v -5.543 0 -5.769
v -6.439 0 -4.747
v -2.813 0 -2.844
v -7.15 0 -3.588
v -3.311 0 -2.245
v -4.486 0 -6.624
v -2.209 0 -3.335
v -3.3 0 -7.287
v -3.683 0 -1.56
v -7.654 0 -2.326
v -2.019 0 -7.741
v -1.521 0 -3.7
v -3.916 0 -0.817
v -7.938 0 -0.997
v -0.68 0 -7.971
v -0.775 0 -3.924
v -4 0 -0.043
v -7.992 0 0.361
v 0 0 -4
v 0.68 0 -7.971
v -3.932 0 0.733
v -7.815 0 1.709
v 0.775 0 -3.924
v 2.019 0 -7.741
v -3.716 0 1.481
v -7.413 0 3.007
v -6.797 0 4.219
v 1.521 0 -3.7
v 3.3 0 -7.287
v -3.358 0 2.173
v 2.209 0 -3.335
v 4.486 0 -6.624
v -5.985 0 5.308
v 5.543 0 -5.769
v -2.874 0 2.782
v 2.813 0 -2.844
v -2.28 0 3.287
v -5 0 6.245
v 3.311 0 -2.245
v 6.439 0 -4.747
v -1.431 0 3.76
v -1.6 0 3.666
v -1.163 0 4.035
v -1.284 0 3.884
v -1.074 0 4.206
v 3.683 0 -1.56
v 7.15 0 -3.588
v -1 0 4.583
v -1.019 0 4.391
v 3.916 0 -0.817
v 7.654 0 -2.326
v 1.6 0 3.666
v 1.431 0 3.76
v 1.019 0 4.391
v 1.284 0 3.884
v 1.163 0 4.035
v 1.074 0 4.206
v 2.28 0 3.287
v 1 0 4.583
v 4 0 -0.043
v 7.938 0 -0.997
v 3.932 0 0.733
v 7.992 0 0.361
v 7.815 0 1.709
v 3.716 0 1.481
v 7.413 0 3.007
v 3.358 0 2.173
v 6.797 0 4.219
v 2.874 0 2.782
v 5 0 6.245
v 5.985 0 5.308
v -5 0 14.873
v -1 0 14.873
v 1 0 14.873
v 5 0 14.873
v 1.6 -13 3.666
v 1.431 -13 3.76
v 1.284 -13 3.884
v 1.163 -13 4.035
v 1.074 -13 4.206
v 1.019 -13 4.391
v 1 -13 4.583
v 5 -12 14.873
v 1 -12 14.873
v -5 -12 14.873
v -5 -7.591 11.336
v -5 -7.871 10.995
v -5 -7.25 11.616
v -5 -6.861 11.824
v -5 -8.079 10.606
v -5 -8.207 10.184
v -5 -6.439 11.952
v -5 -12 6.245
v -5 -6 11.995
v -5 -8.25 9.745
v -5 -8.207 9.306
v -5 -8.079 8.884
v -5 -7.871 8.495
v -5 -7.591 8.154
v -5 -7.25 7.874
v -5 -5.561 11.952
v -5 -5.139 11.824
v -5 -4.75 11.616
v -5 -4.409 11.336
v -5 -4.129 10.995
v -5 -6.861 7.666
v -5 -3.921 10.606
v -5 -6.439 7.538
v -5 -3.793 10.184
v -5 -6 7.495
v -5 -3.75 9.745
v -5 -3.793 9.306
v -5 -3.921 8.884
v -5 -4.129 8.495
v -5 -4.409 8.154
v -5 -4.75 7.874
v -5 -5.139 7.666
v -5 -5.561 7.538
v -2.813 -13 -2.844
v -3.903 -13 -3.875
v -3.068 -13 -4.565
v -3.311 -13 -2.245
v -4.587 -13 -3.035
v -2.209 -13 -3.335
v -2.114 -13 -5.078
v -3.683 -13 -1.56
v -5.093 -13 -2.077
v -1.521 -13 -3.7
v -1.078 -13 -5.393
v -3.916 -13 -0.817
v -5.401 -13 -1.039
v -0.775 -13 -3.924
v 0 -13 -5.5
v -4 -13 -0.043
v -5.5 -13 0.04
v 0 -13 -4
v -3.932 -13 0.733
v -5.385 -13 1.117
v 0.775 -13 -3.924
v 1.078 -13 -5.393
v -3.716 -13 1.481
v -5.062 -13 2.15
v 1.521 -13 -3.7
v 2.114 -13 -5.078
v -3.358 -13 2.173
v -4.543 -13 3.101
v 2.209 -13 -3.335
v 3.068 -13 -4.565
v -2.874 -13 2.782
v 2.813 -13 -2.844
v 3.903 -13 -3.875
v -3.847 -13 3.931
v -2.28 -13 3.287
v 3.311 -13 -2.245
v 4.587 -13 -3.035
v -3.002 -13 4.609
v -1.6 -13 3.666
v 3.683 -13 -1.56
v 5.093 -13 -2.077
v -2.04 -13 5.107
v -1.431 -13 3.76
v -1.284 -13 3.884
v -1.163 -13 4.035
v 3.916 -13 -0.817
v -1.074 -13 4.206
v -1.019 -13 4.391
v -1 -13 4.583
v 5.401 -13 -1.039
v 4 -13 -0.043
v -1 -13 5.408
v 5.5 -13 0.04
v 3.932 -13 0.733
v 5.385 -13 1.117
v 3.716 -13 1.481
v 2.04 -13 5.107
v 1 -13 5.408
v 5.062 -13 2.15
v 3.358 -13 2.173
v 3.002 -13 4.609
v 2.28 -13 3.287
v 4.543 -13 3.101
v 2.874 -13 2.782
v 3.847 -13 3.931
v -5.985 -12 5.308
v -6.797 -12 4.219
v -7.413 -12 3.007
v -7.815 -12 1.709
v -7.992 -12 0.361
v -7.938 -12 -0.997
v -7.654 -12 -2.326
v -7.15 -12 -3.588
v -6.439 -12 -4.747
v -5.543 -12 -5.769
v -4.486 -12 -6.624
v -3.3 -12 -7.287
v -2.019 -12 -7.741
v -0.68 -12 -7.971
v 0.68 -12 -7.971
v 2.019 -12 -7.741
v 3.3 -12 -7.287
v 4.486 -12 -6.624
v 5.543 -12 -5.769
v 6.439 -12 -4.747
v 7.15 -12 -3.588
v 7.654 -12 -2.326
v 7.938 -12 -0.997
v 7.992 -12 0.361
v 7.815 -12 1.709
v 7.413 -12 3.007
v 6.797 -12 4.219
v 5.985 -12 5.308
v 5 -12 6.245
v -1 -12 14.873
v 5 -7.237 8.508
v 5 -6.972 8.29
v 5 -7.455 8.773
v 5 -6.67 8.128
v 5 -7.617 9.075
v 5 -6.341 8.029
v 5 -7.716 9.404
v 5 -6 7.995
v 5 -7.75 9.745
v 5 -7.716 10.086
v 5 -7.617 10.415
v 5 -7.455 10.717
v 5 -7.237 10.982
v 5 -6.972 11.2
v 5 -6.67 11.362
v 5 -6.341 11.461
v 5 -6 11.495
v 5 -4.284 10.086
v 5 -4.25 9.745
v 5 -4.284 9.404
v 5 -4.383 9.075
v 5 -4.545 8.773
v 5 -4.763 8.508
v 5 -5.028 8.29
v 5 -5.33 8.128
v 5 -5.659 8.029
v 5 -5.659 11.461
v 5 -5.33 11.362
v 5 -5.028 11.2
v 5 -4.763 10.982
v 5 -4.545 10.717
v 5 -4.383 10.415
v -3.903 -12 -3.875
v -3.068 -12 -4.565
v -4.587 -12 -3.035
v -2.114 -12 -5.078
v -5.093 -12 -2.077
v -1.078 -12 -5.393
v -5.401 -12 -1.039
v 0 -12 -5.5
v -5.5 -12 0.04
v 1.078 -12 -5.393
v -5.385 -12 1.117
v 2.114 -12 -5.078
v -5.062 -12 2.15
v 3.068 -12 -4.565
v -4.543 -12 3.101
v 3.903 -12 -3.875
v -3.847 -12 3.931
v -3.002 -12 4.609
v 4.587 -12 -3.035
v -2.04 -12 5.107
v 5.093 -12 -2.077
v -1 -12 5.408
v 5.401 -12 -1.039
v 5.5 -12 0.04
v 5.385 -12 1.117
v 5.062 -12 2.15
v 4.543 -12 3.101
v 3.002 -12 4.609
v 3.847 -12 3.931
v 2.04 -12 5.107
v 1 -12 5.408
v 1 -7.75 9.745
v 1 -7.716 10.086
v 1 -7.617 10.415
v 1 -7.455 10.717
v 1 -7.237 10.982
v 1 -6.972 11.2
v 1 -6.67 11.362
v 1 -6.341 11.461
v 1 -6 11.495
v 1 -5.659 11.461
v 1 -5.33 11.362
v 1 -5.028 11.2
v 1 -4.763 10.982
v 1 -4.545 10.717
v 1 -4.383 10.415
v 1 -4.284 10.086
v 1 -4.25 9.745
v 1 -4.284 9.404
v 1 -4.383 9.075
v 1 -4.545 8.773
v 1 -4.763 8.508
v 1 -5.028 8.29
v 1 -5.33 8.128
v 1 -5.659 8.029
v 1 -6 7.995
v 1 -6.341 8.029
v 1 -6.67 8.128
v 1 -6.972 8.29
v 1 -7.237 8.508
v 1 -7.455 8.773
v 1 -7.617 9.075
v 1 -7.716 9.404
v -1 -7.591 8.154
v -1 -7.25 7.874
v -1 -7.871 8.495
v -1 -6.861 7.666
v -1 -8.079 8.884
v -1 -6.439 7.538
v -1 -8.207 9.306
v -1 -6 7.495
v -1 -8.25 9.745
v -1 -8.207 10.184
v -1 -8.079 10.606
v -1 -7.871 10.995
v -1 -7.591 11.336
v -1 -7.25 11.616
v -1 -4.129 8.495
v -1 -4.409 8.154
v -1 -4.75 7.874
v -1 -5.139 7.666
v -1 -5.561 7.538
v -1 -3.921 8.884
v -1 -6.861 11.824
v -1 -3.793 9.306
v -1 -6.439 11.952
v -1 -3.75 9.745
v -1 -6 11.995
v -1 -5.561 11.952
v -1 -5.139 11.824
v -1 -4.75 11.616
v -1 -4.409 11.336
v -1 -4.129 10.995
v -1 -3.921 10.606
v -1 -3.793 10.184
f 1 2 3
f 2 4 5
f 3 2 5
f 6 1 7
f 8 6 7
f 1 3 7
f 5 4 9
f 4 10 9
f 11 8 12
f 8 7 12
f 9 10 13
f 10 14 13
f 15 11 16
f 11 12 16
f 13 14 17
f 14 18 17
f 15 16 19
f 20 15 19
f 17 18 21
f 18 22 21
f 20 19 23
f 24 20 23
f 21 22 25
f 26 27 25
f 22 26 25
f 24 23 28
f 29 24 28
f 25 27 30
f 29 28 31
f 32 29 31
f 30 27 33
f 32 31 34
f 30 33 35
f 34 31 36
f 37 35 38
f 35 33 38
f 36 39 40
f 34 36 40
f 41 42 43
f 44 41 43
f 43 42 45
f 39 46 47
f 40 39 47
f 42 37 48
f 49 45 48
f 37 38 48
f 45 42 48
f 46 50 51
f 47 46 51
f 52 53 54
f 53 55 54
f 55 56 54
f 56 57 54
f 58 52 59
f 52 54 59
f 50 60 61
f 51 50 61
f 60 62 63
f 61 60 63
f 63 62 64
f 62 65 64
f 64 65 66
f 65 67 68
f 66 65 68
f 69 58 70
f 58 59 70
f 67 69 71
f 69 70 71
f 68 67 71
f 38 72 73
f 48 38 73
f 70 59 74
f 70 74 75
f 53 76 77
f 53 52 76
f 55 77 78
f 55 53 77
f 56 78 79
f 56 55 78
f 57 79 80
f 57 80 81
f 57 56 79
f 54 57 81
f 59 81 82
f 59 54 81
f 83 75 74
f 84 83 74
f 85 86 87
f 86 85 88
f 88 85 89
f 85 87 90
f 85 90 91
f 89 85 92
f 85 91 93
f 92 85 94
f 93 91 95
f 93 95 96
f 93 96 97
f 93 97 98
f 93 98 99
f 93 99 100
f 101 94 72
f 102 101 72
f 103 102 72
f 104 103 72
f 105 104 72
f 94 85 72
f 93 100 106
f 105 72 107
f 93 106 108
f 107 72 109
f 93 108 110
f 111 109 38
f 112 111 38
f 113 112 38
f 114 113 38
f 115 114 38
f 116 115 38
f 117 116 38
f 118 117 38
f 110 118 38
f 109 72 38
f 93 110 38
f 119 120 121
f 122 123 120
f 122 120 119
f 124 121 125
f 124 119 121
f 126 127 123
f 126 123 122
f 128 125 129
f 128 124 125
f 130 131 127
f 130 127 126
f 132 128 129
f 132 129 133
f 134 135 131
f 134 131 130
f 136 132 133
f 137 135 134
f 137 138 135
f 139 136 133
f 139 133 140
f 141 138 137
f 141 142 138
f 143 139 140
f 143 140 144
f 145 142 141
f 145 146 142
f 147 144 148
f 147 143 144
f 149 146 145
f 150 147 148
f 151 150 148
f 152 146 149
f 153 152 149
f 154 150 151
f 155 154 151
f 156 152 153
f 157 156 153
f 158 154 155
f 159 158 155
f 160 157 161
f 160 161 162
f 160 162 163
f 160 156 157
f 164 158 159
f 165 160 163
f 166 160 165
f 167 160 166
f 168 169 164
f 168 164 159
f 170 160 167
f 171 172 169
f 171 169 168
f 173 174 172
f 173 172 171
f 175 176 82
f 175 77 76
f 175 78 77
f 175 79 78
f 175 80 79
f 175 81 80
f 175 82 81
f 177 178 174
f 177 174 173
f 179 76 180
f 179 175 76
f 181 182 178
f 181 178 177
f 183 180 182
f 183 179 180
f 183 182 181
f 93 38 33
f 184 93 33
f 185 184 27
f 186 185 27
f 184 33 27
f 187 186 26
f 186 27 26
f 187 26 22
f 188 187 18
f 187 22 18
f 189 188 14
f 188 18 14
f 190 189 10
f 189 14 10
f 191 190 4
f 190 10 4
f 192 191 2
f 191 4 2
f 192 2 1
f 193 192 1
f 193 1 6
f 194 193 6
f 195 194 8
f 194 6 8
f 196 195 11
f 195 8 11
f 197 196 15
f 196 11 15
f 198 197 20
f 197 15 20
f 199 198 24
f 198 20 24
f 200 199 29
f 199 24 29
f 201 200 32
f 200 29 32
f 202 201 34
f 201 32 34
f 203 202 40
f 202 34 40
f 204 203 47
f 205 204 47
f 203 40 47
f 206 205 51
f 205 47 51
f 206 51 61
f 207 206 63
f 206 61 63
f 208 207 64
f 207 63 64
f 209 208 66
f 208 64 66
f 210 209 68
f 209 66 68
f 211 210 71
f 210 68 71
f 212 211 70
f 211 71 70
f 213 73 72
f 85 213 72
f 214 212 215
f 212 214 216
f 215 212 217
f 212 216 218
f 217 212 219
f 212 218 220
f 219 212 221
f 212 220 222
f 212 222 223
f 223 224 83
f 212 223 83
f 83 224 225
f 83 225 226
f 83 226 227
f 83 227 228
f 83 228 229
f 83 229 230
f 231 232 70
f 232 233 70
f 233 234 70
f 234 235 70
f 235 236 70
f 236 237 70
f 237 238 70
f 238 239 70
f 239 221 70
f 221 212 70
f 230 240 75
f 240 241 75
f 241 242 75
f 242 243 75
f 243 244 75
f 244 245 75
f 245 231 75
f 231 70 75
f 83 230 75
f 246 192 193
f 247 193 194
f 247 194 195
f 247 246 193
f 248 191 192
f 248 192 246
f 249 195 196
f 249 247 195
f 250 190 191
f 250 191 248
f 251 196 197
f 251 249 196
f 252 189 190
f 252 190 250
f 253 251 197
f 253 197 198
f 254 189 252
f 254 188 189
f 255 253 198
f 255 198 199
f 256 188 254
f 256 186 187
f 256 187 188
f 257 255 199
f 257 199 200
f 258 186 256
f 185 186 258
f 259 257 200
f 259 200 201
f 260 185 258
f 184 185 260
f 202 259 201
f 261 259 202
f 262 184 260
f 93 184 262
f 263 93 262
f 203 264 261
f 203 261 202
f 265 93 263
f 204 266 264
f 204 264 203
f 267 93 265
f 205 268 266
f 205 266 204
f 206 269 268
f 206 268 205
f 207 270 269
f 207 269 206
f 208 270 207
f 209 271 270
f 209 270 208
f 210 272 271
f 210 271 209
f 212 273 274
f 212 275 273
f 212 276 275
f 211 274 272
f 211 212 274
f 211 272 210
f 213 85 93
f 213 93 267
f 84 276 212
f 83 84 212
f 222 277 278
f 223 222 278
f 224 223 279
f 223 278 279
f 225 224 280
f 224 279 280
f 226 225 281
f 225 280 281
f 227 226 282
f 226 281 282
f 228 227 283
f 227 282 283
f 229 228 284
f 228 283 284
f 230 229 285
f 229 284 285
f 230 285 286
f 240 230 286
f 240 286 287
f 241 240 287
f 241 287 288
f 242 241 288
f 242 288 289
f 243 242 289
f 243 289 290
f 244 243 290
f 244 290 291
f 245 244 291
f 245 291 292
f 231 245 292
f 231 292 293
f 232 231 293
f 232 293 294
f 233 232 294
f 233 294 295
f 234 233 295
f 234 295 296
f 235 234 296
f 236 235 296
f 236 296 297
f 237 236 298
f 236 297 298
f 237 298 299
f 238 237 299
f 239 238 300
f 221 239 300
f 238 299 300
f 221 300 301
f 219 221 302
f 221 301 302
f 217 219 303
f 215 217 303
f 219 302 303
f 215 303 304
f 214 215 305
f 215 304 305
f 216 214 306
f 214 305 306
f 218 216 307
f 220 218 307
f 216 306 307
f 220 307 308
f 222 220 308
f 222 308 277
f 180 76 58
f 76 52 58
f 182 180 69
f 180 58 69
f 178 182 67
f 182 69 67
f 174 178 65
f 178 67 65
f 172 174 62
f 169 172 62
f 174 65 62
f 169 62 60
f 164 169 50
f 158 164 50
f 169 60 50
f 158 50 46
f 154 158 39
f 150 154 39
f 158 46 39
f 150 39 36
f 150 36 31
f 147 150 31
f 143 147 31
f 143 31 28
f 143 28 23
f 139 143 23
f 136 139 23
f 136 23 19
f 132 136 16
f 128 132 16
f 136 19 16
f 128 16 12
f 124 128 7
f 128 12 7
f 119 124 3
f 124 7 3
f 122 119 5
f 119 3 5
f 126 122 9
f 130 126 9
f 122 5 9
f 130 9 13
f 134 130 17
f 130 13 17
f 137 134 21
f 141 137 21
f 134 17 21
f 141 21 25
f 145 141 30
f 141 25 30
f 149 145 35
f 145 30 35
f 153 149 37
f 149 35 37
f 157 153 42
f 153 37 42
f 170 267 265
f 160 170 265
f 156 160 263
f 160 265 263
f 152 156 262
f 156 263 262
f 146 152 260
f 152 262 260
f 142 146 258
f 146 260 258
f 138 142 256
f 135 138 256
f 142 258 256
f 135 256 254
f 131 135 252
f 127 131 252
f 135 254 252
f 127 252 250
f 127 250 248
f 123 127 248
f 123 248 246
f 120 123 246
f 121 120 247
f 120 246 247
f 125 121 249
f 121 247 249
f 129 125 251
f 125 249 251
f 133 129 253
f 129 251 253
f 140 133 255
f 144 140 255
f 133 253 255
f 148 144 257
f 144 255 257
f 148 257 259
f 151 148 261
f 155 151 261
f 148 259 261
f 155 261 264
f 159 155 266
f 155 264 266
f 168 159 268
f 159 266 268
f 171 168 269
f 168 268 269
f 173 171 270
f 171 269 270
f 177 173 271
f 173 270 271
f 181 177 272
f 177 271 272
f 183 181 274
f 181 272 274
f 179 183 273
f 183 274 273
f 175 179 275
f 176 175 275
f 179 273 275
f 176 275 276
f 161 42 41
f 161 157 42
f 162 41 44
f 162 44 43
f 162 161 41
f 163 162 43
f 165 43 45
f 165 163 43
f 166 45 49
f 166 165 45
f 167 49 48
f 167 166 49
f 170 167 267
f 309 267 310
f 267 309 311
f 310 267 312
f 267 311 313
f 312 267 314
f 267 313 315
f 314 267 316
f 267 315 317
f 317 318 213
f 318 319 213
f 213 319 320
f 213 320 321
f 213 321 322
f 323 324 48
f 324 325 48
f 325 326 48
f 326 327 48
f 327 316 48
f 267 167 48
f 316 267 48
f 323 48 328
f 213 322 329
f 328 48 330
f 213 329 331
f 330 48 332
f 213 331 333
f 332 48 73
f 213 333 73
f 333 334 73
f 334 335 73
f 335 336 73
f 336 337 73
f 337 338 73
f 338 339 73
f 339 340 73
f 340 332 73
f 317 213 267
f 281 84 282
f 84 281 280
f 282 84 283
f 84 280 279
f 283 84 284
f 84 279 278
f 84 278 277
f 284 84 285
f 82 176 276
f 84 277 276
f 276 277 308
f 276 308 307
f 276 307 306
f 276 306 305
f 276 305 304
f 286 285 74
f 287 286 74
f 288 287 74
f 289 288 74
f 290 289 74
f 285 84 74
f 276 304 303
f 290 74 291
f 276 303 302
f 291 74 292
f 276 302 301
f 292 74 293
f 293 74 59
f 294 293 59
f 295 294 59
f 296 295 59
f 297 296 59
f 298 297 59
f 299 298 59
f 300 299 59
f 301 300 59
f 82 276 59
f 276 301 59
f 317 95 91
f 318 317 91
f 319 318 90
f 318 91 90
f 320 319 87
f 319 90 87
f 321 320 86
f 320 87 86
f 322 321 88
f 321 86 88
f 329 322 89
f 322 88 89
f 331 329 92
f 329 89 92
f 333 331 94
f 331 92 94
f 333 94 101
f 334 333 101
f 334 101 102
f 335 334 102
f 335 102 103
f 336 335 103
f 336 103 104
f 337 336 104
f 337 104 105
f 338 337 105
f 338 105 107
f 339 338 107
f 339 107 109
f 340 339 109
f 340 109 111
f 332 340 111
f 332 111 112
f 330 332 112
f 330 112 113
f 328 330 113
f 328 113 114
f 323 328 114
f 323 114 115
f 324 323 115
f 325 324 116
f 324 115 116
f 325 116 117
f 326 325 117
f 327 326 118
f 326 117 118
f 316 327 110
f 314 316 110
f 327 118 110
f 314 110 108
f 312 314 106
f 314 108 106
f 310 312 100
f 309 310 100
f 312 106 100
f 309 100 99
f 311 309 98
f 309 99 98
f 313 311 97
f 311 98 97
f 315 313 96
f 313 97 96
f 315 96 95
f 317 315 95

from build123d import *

# Parameters (mm, degrees)
F1_DEPTH = 12
F3_DEPTH = 1
F4_R     = 1
F5_R     = 1.75
F6_DEPTH = 11.8
F7_R     = 2.25
F8_DEPTH = 4.8


with BuildPart() as f1:
    # F0 (on Front) → F1 (new body)
    with BuildSketch(Plane.XZ):
        with BuildLine():
            ThreePointArc((1, 3.872983), (0, -4), (-1, 3.872983))
            Line((-1, 3.872983), (-1, 14.872983))
            Line((-1, 14.872983), (-5, 14.872983))
            Line((-5, 14.872983), (-5, 6.244998))
            ThreePointArc((-5, 6.244998), (0, -8), (5, 6.244998))
            Line((5, 6.244998), (5, 14.872983))
            Line((5, 14.872983), (1, 14.872983))
            Line((1, 14.872983), (1, 3.872983))
        make_face()
    extrude(amount=F1_DEPTH)

    # F2 (on face) → F3 (join)
    with BuildSketch(Plane.XZ.offset(12)):
        with BuildLine():
            ThreePointArc((1, 3.872983), (0, -4), (-1, 3.872983))
            Line((-1, 3.872983), (-1, 5.408327))
            ThreePointArc((-1, 5.408327), (0, -5.5), (1, 5.408327))
            Line((1, 5.408327), (1, 3.872983))
        make_face()
    extrude(amount=F3_DEPTH)

    # F4
    f4_edges = [f1.edges().sort_by_distance(p)[0] for p in [
        (-1, -6.5, 3.872983),
        (1, -6.5, 3.872983),
    ]]
    fillet(f4_edges, radius=F4_R)

    # F5 (on face) → F6 (cut)
    with BuildSketch(Plane(origin=(-5, 0, 0), x_dir=(0, -1, 0), z_dir=(-1, 0, 0))):
        with Locations((6, 9.744998)):
            Circle(F5_R)
    extrude(amount=-F6_DEPTH, mode=Mode.SUBTRACT)

    # F7 (on face) → F8 (cut)
    with BuildSketch(Plane(origin=(-5, 0, 0), x_dir=(0, -1, 0), z_dir=(-1, 0, 0))):
        with Locations((6, 9.744998)):
            Circle(F7_R)
    extrude(amount=-F8_DEPTH, mode=Mode.SUBTRACT)


solid = f1.part
